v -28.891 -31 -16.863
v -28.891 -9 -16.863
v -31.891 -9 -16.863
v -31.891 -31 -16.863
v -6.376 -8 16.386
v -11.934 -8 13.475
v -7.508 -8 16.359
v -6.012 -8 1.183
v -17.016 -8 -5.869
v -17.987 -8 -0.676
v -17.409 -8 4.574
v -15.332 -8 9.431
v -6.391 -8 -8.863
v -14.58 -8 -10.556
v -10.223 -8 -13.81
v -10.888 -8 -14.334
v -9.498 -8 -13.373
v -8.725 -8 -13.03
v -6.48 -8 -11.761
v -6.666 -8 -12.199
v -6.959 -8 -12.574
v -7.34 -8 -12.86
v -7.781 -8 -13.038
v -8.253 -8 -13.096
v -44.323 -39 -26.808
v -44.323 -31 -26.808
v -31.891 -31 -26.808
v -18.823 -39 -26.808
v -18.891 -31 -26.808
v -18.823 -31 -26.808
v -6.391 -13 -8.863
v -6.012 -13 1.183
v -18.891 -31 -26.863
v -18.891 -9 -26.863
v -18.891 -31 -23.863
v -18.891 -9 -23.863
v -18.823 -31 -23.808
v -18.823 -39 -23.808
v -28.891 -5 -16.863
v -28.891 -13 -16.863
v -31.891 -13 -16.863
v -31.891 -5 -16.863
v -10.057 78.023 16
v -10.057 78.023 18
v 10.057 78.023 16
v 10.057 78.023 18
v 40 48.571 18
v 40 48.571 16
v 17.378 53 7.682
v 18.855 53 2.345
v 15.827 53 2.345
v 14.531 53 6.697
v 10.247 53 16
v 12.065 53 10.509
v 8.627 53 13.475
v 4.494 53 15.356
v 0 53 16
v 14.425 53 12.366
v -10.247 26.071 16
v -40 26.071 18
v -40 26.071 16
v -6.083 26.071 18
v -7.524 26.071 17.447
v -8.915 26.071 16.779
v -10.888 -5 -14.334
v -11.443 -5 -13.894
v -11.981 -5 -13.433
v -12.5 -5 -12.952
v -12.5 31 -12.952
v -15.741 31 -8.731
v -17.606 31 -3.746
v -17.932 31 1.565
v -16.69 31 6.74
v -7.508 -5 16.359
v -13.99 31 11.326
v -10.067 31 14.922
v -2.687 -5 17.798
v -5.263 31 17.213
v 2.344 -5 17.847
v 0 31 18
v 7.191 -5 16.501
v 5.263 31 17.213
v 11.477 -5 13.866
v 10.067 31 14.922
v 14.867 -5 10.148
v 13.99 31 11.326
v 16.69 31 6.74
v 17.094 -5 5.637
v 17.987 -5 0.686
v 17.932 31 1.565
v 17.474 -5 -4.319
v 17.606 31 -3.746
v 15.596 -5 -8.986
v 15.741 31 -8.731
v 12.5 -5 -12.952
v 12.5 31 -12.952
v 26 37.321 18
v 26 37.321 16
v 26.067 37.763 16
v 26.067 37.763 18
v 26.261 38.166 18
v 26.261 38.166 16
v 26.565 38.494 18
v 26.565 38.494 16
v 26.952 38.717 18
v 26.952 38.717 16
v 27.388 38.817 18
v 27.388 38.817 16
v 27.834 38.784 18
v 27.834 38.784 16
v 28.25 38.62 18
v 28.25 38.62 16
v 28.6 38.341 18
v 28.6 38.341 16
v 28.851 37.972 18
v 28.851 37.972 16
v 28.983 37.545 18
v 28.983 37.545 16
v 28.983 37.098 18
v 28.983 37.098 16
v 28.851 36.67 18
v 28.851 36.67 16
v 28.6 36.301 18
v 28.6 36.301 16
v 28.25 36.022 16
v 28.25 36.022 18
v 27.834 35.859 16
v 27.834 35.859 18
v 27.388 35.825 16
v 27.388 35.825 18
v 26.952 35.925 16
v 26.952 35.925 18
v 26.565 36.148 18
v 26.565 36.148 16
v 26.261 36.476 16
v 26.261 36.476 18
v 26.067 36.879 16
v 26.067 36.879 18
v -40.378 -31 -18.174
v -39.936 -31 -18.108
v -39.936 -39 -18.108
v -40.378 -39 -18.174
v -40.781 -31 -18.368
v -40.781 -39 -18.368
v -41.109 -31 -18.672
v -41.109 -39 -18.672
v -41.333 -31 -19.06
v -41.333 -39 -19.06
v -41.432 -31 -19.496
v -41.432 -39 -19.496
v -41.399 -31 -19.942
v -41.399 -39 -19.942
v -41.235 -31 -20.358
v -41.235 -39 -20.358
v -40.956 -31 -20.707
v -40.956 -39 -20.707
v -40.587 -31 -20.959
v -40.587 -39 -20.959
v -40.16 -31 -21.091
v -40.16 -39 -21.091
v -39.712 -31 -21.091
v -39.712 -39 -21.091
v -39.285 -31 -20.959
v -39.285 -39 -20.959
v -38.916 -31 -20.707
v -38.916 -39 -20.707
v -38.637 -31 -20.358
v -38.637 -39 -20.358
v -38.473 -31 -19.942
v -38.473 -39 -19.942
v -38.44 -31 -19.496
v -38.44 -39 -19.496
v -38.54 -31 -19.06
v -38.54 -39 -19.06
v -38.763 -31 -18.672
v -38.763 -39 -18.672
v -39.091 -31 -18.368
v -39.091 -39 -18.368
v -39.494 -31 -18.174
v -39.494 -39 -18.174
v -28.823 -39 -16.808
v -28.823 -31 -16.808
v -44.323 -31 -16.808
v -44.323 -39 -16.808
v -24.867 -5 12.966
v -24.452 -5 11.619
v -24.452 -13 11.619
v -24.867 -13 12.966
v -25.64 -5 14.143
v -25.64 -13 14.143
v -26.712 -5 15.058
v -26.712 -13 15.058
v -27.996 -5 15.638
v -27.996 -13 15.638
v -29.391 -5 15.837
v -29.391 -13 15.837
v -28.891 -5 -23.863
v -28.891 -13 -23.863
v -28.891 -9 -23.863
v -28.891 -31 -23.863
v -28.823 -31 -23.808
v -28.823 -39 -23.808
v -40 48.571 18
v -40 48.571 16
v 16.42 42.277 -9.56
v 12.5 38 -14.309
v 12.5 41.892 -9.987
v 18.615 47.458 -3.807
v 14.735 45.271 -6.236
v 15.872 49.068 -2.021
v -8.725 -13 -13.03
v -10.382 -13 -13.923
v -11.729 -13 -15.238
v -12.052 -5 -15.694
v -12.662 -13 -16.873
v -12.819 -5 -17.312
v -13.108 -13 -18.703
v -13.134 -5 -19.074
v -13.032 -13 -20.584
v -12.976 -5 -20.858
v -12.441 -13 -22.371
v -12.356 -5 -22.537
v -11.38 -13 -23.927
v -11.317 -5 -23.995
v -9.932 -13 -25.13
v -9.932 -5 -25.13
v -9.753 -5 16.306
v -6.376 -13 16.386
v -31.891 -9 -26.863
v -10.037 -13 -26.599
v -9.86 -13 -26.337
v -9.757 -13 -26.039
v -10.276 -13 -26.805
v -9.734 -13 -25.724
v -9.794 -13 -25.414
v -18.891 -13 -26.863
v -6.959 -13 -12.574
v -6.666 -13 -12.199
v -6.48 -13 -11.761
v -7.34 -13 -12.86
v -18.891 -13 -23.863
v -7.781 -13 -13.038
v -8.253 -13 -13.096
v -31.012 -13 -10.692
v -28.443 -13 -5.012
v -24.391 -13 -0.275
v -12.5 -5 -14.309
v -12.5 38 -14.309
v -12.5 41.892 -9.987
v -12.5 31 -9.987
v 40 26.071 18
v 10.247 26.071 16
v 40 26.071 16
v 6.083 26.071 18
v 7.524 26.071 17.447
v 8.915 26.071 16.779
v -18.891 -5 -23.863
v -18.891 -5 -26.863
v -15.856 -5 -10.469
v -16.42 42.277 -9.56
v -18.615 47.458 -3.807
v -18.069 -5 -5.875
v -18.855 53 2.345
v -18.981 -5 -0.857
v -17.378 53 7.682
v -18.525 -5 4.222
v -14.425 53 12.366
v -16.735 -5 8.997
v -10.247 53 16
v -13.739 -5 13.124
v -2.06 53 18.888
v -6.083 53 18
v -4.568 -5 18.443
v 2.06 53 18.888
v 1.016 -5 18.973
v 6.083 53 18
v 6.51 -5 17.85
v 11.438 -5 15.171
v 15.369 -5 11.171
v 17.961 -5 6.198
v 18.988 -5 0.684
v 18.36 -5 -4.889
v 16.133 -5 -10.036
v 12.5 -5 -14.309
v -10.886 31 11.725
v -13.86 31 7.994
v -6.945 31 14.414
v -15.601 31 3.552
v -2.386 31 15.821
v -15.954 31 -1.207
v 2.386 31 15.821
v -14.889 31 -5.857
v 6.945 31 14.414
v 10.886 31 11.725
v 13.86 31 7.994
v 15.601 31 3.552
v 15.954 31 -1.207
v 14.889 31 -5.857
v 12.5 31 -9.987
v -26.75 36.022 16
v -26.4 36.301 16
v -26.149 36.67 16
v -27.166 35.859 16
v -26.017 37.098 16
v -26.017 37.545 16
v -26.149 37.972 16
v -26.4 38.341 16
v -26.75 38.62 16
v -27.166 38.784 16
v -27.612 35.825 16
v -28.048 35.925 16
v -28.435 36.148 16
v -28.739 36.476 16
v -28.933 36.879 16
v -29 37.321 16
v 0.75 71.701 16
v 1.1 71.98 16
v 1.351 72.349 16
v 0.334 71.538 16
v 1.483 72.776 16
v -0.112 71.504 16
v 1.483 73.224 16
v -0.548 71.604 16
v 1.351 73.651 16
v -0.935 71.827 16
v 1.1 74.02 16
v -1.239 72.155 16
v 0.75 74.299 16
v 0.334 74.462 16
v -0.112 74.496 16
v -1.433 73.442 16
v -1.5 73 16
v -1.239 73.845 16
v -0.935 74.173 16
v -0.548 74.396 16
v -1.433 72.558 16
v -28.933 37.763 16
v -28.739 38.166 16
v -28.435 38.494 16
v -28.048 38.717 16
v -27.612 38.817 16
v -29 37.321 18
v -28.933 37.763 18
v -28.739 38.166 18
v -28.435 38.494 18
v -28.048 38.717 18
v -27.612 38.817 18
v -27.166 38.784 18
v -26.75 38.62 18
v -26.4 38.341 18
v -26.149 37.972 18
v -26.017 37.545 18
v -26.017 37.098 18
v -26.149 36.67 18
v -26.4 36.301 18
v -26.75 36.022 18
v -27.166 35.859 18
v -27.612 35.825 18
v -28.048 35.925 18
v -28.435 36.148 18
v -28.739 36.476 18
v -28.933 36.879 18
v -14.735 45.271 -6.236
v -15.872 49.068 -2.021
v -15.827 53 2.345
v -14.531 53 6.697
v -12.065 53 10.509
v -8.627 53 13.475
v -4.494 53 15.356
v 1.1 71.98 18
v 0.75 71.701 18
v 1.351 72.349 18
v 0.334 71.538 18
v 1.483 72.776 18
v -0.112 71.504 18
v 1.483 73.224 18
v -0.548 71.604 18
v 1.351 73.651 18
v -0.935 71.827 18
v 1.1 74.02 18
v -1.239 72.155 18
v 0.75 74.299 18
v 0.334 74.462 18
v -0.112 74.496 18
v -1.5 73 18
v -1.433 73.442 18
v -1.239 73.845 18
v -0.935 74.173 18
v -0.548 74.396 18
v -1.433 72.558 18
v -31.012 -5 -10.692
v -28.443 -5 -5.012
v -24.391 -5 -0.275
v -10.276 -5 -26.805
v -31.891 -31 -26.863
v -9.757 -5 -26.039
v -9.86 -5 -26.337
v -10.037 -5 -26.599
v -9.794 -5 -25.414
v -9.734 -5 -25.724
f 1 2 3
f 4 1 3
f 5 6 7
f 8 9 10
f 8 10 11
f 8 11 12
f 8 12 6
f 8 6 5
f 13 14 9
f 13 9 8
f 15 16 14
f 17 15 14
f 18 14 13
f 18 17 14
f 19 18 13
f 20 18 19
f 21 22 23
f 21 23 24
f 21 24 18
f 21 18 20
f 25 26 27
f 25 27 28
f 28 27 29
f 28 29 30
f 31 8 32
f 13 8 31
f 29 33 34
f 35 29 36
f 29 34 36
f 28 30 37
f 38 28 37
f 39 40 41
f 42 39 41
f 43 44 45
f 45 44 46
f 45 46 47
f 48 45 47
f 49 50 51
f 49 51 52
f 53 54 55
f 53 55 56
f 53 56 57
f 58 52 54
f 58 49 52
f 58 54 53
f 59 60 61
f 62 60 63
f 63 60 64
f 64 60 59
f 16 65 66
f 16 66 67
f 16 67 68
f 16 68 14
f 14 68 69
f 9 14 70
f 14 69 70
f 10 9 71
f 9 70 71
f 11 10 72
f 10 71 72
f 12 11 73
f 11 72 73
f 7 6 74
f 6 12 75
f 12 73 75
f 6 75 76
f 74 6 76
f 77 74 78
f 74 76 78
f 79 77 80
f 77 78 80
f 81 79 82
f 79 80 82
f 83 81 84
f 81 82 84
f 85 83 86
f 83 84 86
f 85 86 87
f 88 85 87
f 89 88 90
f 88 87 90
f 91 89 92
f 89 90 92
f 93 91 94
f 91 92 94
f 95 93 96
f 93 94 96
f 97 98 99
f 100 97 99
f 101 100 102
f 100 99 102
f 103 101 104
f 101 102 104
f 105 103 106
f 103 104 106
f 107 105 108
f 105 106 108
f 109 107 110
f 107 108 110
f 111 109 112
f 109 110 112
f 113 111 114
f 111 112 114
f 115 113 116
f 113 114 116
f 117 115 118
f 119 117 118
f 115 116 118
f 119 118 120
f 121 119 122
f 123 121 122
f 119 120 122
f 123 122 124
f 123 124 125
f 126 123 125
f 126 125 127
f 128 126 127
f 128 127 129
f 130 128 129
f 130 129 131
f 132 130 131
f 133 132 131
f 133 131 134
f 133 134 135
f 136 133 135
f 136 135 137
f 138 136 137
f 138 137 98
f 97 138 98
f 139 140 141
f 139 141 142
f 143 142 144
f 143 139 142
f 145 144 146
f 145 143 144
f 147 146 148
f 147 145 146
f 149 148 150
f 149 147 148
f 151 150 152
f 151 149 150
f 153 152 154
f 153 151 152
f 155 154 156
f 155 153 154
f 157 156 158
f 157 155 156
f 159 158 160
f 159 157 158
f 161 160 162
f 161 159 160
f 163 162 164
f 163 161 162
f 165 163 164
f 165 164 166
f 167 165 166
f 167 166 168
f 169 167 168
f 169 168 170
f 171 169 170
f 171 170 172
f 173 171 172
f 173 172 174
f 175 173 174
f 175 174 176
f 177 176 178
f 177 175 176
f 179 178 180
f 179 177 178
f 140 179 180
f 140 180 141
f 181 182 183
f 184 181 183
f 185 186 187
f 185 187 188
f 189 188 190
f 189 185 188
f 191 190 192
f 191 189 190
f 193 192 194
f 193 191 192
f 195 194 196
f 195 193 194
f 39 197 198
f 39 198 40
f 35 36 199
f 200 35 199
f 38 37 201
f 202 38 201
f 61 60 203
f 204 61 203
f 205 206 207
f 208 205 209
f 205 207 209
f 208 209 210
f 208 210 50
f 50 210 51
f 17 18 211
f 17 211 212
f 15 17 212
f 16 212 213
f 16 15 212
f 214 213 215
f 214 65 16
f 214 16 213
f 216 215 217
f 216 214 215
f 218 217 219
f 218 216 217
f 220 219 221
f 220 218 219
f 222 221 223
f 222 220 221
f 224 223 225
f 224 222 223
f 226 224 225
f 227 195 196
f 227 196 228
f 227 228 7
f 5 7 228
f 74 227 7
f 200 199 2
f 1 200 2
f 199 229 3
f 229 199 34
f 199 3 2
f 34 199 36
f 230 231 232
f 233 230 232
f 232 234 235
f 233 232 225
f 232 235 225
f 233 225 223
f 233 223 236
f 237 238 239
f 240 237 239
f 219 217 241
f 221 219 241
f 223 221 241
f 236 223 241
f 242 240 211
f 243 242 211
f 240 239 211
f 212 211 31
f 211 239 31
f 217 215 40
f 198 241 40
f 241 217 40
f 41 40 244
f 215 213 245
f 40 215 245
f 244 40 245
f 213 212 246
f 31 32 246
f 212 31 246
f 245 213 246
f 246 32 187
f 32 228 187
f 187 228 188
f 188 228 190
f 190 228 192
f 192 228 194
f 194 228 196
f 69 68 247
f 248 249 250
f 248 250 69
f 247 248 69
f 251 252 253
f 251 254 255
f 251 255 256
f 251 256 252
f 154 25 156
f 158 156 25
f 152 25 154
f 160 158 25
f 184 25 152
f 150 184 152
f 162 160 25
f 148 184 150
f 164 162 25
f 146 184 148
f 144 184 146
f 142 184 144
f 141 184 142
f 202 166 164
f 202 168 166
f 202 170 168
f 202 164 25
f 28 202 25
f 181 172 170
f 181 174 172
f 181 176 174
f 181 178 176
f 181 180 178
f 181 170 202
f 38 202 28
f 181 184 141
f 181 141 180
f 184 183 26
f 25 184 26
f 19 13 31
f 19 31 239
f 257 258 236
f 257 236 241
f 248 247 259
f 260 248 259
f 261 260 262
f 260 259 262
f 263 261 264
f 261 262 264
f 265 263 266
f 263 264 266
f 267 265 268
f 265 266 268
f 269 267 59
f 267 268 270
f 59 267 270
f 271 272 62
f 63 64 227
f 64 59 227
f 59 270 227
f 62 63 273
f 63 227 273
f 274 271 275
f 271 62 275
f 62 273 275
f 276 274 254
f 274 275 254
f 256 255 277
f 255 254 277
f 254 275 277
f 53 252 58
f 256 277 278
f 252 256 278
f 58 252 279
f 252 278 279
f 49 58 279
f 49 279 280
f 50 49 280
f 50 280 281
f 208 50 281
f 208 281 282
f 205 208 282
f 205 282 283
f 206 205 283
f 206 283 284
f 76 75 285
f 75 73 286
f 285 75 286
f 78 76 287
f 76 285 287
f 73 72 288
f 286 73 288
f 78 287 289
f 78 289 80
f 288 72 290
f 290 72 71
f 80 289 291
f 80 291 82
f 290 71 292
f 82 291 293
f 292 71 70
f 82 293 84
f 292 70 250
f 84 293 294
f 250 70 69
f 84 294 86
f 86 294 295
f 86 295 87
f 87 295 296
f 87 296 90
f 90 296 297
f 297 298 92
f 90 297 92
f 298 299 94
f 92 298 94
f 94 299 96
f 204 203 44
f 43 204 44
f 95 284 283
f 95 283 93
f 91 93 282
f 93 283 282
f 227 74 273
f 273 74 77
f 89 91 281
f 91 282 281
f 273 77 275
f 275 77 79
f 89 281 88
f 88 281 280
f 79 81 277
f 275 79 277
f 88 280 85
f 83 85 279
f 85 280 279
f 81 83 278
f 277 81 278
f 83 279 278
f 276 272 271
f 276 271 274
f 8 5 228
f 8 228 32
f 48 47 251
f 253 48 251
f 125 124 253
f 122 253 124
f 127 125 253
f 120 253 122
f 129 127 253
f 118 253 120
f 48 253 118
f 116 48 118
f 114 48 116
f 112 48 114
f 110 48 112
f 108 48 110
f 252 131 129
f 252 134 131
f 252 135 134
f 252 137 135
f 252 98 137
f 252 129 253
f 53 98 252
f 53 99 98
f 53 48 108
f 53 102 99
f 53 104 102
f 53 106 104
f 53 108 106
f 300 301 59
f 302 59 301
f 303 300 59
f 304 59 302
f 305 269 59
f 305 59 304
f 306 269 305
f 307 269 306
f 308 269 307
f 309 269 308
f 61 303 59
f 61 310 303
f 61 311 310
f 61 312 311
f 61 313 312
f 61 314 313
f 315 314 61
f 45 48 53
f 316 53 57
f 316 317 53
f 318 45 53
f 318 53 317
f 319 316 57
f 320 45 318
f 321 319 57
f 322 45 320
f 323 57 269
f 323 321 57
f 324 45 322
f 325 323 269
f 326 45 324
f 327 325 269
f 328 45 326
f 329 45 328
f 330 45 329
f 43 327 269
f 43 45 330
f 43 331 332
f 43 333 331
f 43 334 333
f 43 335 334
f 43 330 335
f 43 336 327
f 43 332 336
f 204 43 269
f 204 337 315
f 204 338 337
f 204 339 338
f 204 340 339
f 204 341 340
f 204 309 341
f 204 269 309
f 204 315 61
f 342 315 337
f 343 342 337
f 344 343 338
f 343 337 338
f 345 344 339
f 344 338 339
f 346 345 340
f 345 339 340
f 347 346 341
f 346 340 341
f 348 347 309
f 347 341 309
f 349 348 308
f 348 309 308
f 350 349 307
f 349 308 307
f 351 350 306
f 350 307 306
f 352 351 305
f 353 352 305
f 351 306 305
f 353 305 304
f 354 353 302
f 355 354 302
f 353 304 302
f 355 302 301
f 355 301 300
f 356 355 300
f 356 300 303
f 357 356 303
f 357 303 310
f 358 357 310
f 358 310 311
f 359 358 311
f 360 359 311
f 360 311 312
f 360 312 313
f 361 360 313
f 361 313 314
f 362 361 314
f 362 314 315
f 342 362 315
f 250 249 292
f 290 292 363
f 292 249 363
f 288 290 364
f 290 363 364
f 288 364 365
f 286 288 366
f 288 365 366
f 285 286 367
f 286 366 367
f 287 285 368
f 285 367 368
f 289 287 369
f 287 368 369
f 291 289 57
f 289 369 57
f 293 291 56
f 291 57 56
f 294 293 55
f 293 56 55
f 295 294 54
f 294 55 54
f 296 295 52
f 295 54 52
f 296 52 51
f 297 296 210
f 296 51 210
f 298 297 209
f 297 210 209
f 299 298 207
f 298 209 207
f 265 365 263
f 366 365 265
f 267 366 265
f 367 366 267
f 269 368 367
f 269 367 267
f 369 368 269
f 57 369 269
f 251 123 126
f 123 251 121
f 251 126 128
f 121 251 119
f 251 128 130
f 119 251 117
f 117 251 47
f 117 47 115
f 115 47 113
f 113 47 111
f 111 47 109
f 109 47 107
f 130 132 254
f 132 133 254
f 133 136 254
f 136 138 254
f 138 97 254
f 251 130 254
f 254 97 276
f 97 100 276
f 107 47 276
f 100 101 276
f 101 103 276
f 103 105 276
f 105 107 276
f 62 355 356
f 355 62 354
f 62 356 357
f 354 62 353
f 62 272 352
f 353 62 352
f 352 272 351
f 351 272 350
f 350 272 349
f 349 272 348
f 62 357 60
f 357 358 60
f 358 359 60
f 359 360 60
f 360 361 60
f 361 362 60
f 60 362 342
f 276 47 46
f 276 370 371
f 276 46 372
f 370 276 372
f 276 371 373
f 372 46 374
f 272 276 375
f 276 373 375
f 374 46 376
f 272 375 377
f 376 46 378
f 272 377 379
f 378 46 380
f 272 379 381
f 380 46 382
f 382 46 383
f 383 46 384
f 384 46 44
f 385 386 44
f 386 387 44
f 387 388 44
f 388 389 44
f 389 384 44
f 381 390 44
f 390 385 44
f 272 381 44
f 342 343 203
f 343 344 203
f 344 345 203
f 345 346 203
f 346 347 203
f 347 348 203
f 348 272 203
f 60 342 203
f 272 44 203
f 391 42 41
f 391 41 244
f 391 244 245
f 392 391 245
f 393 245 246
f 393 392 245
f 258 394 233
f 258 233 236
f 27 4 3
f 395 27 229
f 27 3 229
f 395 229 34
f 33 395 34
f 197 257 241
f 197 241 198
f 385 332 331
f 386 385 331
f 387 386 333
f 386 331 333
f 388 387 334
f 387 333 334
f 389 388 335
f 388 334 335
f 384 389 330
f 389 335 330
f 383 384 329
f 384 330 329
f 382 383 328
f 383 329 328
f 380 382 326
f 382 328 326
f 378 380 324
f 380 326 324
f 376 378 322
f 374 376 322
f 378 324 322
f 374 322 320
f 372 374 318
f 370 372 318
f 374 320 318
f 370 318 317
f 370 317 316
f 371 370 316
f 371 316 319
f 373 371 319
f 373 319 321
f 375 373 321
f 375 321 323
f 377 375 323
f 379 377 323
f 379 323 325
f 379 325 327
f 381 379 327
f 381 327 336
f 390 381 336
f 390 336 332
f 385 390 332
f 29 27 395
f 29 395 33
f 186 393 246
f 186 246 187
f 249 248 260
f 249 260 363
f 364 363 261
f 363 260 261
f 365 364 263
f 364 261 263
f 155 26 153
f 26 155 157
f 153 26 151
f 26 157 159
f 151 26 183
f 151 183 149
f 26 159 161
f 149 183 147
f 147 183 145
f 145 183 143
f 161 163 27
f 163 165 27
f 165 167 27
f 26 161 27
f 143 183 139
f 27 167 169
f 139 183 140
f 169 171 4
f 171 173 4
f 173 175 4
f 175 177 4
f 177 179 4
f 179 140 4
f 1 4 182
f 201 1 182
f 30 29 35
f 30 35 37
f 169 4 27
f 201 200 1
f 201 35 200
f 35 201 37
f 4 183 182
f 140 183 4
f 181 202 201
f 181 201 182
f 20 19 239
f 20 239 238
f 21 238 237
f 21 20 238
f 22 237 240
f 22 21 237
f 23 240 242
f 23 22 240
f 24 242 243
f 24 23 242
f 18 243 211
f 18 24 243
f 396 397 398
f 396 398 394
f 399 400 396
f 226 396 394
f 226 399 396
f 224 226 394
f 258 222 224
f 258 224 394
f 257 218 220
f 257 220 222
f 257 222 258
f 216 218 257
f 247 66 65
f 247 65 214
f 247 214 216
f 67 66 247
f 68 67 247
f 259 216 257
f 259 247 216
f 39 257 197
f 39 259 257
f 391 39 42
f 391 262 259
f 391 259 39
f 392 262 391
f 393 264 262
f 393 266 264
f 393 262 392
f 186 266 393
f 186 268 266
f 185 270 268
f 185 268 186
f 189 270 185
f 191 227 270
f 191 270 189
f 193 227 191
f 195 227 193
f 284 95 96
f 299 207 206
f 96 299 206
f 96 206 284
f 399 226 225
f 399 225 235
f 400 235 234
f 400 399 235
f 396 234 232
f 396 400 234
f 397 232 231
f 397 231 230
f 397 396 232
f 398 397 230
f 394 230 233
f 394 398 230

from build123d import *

# Parameters (mm, degrees)
BOSS_EXTRUDE1_DEPTH      = 53
BOSS_EXTRUDE1_DEPTH_BACK = 5
SKETCH1_R                = 19
SKETCH2_R                = 16
CUT_EXTRUDE1_DEPTH       = 22
SKETCH3_W                = 25
SKETCH3_H                = 20
CUT_EXTRUDE2_DEPTH       = 108
CUT_EXTRUDE3_DEPTH       = 108
CUT_EXTRUDE3_DEPTH_BACK  = 108
BOSS_EXTRUDE2_DEPTH      = 2
SKETCH10_R               = 1.5
CUT_EXTRUDE4_DEPTH       = 16
BOSS_EXTRUDE3_DEPTH      = 8
BOSS_EXTRUDE5_DEPTH      = 18
BOSS_EXTRUDE5_DEPTH_BACK = 4
SKETCH13_R               = 1.500172947
BOSS_EXTRUDE6_DEPTH      = 8
SKETCH15_R               = 18
CUT_EXTRUDE5_DEPTH       = 39


with BuildPart() as part:
    # Sketch1 → Boss-Extrude1 (new, two sides: drawn at the far end of the back side and taken through both)
    with BuildSketch(Plane(origin=(0, 0, 0), x_dir=(1, 0, 0), z_dir=(0, 1, 0)).offset(-BOSS_EXTRUDE1_DEPTH_BACK)):
        with Locations(Location((0, 0, 0), (0, 0, 270))):
            Circle(SKETCH1_R)
    extrude(amount=BOSS_EXTRUDE1_DEPTH + BOSS_EXTRUDE1_DEPTH_BACK)

    # Sketch2 → Cut-Extrude1 (cut)
    with BuildSketch(Plane(origin=(0, 53, 0), x_dir=(1, 0, 0), z_dir=(0, 1, 0))):
        with Locations(Location((0, 0, 0), (0, 0, 270))):
            Circle(SKETCH2_R)
    extrude(amount=-CUT_EXTRUDE1_DEPTH, mode=Mode.SUBTRACT)

    # Sketch3 → Cut-Extrude2 (cut)
    with BuildSketch(Plane(origin=(0, 53, 0), x_dir=(1, 0, 0), z_dir=(0, 1, 0))):
        with Locations((0, 16)):
            Rectangle(SKETCH3_W, SKETCH3_H)
    extrude(amount=-CUT_EXTRUDE2_DEPTH, mode=Mode.SUBTRACT)

    # Sketch7 → Cut-Extrude3 (cut, two sides: drawn at the far end of the back side and taken through both)
    with BuildSketch(Plane(origin=(0, 0, 0), x_dir=(0, 0, -1), z_dir=(1, 0, 0)).offset(-CUT_EXTRUDE3_DEPTH_BACK)):
        Polygon((14.309088021, 53), (14.309088021, 38), (-2.345455989, 53), align=None)
    extrude(amount=CUT_EXTRUDE3_DEPTH + CUT_EXTRUDE3_DEPTH_BACK, mode=Mode.SUBTRACT)

    # Sketch8 → Boss-Extrude2 (add)
    with BuildSketch(Plane.XY.offset(18)):
        Polygon((10.05709572, 78.023156751), (40, 48.571119754), (40, 26.071119754), (0, 26.071119754), (-40, 26.071119754), (-40, 48.571119754), (-10.05709572, 78.023156751), align=None)
    extrude(amount=-BOSS_EXTRUDE2_DEPTH)

    # Sketch10 → Cut-Extrude4 (cut)
    with BuildSketch(Plane(origin=(0, 0, 16), x_dir=(-1, 0, 0), z_dir=(0, 0, -1))):
        with Locations((-27.5, 37.321119754)):
            Circle(SKETCH10_R)
        with Locations((27.5, 37.321119754)):
            Circle(SKETCH10_R)
        with Locations((0, 73)):
            Circle(SKETCH10_R)
    extrude(amount=-CUT_EXTRUDE4_DEPTH, mode=Mode.SUBTRACT)

    # Sketch11 → Boss-Extrude3 (add)
    with BuildSketch(Plane.XZ.offset(5)):
        with BuildLine():
            Line((-6.390882144, -8.863379027), (-6.480237612, -11.760990645))
            ThreePointArc((-6.480237612, -11.760990645), (-7.33967567, -12.860163004), (-8.724622378, -13.029680754))
            ThreePointArc((-8.724622378, -13.029680754), (-13.107641391, -18.70255332), (-9.931897769, -25.129604841))
            ThreePointArc((-9.931897769, -25.129604841), (-9.756819698, -26.038761874), (-10.275891909, -26.805431868))
            Line((-10.275891909, -26.805431868), (-18.890882144, -26.863380934))
            Line((-18.890882144, -26.863380934), (-18.890882144, -23.863377119))
            Line((-18.890882144, -23.863377119), (-28.890882144, -23.863377119))
            Line((-28.890882144, -23.863377119), (-28.890882144, -16.863377119))
            Line((-28.890882144, -16.863377119), (-31.890882144, -16.863377119))
            ThreePointArc((-31.890882144, -16.863377119), (-29.928759086, -7.76088478), (-24.390882144, -0.275084044))
            Line((-24.390882144, -0.275084044), (-24.452405581, 11.618795847))
            ThreePointArc((-24.452405581, 11.618795847), (-26.143620347, 14.638664645), (-29.390882144, 15.836623644))
            Line((-29.390882144, 15.836623644), (-6.375618396, 16.386397999))
            Line((-6.375618396, 16.386397999), (-6.012446141, 1.182878311))
            Line((-6.012446141, 1.182878311), (-6.390882144, -8.863379027))
        make_face()
    extrude(amount=BOSS_EXTRUDE3_DEPTH)

    # Sketch15 → Cut-Extrude5 (cut)
    with BuildSketch(Plane(origin=(0, 31, 0), x_dir=(1, 0, 0), z_dir=(0, 1, 0))):
        Circle(SKETCH15_R)
    extrude(amount=-CUT_EXTRUDE5_DEPTH, mode=Mode.SUBTRACT)


with BuildPart() as body_2:
    # Sketch12 → Boss-Extrude5 (new, two sides: drawn at the far end of the back side and taken through both)
    with BuildSketch(Plane.XZ.offset(13).offset(-BOSS_EXTRUDE5_DEPTH_BACK)):
        Polygon((-31.890882144, -26.863380934), (-18.890882144, -26.863380934), (-18.890882144, -23.863377119), (-28.890882144, -23.863377119), (-28.890882144, -16.863377119), (-31.890882144, -16.863377119), align=None)
    extrude(amount=BOSS_EXTRUDE5_DEPTH + BOSS_EXTRUDE5_DEPTH_BACK)

    # Sketch13 → Boss-Extrude6 (add)
    with BuildSketch(Plane.XZ.offset(31)):
        Polygon((-44.322698898, -26.807587047), (-18.822698898, -26.807587047), (-18.822698898, -23.807583233), (-28.822698898, -23.807583233), (-28.822698898, -16.807583233), (-44.322698898, -16.807583233), align=None)
        with Locations(Location((-39.936045011, -19.607691517, 0), (0, 0, 90))):
            Circle(SKETCH13_R, mode=Mode.SUBTRACT)
    extrude(amount=BOSS_EXTRUDE6_DEPTH)


solid = Compound([part.part, body_2.part])
